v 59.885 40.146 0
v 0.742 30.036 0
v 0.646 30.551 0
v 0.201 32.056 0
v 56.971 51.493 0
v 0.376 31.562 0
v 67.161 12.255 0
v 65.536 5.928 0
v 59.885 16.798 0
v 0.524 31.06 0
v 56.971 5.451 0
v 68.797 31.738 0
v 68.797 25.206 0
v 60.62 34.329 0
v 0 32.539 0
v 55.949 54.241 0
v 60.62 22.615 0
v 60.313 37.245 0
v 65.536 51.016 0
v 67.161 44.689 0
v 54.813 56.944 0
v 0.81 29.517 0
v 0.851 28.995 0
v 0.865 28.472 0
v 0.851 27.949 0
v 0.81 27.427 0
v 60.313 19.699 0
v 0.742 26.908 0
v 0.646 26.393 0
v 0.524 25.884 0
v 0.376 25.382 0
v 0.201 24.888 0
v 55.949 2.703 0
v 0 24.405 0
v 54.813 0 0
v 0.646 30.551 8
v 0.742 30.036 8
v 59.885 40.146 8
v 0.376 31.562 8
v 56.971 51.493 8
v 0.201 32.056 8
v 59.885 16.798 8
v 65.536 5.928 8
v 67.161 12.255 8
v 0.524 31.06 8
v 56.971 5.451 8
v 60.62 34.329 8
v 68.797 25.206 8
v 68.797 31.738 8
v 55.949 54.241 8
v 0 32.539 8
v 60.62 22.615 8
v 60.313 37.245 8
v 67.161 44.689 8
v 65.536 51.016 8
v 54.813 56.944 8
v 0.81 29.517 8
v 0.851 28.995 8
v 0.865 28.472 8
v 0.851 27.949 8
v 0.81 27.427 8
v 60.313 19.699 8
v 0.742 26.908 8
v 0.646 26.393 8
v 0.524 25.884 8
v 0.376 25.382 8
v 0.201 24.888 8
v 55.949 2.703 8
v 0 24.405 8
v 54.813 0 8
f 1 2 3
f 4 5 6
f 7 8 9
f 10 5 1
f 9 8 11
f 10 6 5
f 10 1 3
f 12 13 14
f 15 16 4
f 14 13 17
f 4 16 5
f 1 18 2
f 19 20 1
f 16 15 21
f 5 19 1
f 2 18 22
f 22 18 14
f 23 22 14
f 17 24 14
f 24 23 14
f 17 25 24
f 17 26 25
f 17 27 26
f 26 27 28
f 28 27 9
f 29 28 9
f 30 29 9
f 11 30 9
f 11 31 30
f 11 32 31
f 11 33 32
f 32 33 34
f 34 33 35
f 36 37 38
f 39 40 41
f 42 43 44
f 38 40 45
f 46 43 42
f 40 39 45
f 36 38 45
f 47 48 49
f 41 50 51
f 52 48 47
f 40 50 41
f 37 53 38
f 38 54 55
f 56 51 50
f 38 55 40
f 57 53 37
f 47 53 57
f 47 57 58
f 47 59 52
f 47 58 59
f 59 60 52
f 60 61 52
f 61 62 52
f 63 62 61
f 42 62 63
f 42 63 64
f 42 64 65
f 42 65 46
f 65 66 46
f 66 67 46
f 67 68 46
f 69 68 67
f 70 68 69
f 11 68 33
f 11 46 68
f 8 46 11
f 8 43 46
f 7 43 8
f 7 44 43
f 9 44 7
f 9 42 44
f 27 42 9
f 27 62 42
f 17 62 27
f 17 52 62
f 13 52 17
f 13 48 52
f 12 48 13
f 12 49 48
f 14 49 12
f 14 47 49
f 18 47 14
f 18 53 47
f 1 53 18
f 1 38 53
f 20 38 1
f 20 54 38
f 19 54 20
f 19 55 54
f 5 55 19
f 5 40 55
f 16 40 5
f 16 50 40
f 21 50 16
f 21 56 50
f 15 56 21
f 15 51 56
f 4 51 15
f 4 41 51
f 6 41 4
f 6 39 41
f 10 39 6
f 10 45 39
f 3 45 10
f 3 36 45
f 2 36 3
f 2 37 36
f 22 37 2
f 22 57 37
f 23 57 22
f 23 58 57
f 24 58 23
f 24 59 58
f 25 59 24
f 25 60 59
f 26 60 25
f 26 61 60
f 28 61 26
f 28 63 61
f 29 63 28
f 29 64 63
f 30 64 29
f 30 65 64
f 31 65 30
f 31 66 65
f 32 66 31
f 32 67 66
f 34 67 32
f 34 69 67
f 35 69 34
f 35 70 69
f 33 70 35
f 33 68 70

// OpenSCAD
$fn = 32;

// ----------------------------------------------------------------------
// Gear sector: 3 teeth on 48 degrees
// ----------------------------------------------------------------------

// --- parameters (mm) ---
sector_angle = 48;        // sector angle, degrees
root_r = 70;              // root circle radius
tooth_h = 8;              // tooth height over the root circle
teeth = 3;                // number of teeth on the sector
hub_r = 10;               // hub bore radius
plate_t = 8;              // sector thickness, Z
arc_step = 3;             // sampling step of the root/hub arcs, degrees

tip_r = root_r + tooth_h;  // tip circle radius

profile = [[54.813, 0], [55.949, 2.703], [56.971, 5.451], [65.536, 5.928], [67.161, 12.255], [59.885, 16.798], [60.313, 19.699], [60.62, 22.615], [68.797, 25.206], [68.797, 31.738], [60.62, 34.329], [60.313, 37.245], [59.885, 40.146], [67.161, 44.689], [65.536, 51.016], [56.971, 51.493], [55.949, 54.241], [54.813, 56.944], [0, 32.539], [0.201, 32.056], [0.376, 31.562], [0.524, 31.06], [0.646, 30.551], [0.742, 30.036], [0.81, 29.517], [0.851, 28.995], [0.865, 28.472], [0.851, 27.949], [0.81, 27.427], [0.742, 26.908], [0.646, 26.393], [0.524, 25.884], [0.376, 25.382], [0.201, 24.888], [0, 24.405]];  // primary outline, 35 points, counter clockwise

// --- the one profile operation ---
linear_extrude(height = plate_t) polygon(points = profile);
